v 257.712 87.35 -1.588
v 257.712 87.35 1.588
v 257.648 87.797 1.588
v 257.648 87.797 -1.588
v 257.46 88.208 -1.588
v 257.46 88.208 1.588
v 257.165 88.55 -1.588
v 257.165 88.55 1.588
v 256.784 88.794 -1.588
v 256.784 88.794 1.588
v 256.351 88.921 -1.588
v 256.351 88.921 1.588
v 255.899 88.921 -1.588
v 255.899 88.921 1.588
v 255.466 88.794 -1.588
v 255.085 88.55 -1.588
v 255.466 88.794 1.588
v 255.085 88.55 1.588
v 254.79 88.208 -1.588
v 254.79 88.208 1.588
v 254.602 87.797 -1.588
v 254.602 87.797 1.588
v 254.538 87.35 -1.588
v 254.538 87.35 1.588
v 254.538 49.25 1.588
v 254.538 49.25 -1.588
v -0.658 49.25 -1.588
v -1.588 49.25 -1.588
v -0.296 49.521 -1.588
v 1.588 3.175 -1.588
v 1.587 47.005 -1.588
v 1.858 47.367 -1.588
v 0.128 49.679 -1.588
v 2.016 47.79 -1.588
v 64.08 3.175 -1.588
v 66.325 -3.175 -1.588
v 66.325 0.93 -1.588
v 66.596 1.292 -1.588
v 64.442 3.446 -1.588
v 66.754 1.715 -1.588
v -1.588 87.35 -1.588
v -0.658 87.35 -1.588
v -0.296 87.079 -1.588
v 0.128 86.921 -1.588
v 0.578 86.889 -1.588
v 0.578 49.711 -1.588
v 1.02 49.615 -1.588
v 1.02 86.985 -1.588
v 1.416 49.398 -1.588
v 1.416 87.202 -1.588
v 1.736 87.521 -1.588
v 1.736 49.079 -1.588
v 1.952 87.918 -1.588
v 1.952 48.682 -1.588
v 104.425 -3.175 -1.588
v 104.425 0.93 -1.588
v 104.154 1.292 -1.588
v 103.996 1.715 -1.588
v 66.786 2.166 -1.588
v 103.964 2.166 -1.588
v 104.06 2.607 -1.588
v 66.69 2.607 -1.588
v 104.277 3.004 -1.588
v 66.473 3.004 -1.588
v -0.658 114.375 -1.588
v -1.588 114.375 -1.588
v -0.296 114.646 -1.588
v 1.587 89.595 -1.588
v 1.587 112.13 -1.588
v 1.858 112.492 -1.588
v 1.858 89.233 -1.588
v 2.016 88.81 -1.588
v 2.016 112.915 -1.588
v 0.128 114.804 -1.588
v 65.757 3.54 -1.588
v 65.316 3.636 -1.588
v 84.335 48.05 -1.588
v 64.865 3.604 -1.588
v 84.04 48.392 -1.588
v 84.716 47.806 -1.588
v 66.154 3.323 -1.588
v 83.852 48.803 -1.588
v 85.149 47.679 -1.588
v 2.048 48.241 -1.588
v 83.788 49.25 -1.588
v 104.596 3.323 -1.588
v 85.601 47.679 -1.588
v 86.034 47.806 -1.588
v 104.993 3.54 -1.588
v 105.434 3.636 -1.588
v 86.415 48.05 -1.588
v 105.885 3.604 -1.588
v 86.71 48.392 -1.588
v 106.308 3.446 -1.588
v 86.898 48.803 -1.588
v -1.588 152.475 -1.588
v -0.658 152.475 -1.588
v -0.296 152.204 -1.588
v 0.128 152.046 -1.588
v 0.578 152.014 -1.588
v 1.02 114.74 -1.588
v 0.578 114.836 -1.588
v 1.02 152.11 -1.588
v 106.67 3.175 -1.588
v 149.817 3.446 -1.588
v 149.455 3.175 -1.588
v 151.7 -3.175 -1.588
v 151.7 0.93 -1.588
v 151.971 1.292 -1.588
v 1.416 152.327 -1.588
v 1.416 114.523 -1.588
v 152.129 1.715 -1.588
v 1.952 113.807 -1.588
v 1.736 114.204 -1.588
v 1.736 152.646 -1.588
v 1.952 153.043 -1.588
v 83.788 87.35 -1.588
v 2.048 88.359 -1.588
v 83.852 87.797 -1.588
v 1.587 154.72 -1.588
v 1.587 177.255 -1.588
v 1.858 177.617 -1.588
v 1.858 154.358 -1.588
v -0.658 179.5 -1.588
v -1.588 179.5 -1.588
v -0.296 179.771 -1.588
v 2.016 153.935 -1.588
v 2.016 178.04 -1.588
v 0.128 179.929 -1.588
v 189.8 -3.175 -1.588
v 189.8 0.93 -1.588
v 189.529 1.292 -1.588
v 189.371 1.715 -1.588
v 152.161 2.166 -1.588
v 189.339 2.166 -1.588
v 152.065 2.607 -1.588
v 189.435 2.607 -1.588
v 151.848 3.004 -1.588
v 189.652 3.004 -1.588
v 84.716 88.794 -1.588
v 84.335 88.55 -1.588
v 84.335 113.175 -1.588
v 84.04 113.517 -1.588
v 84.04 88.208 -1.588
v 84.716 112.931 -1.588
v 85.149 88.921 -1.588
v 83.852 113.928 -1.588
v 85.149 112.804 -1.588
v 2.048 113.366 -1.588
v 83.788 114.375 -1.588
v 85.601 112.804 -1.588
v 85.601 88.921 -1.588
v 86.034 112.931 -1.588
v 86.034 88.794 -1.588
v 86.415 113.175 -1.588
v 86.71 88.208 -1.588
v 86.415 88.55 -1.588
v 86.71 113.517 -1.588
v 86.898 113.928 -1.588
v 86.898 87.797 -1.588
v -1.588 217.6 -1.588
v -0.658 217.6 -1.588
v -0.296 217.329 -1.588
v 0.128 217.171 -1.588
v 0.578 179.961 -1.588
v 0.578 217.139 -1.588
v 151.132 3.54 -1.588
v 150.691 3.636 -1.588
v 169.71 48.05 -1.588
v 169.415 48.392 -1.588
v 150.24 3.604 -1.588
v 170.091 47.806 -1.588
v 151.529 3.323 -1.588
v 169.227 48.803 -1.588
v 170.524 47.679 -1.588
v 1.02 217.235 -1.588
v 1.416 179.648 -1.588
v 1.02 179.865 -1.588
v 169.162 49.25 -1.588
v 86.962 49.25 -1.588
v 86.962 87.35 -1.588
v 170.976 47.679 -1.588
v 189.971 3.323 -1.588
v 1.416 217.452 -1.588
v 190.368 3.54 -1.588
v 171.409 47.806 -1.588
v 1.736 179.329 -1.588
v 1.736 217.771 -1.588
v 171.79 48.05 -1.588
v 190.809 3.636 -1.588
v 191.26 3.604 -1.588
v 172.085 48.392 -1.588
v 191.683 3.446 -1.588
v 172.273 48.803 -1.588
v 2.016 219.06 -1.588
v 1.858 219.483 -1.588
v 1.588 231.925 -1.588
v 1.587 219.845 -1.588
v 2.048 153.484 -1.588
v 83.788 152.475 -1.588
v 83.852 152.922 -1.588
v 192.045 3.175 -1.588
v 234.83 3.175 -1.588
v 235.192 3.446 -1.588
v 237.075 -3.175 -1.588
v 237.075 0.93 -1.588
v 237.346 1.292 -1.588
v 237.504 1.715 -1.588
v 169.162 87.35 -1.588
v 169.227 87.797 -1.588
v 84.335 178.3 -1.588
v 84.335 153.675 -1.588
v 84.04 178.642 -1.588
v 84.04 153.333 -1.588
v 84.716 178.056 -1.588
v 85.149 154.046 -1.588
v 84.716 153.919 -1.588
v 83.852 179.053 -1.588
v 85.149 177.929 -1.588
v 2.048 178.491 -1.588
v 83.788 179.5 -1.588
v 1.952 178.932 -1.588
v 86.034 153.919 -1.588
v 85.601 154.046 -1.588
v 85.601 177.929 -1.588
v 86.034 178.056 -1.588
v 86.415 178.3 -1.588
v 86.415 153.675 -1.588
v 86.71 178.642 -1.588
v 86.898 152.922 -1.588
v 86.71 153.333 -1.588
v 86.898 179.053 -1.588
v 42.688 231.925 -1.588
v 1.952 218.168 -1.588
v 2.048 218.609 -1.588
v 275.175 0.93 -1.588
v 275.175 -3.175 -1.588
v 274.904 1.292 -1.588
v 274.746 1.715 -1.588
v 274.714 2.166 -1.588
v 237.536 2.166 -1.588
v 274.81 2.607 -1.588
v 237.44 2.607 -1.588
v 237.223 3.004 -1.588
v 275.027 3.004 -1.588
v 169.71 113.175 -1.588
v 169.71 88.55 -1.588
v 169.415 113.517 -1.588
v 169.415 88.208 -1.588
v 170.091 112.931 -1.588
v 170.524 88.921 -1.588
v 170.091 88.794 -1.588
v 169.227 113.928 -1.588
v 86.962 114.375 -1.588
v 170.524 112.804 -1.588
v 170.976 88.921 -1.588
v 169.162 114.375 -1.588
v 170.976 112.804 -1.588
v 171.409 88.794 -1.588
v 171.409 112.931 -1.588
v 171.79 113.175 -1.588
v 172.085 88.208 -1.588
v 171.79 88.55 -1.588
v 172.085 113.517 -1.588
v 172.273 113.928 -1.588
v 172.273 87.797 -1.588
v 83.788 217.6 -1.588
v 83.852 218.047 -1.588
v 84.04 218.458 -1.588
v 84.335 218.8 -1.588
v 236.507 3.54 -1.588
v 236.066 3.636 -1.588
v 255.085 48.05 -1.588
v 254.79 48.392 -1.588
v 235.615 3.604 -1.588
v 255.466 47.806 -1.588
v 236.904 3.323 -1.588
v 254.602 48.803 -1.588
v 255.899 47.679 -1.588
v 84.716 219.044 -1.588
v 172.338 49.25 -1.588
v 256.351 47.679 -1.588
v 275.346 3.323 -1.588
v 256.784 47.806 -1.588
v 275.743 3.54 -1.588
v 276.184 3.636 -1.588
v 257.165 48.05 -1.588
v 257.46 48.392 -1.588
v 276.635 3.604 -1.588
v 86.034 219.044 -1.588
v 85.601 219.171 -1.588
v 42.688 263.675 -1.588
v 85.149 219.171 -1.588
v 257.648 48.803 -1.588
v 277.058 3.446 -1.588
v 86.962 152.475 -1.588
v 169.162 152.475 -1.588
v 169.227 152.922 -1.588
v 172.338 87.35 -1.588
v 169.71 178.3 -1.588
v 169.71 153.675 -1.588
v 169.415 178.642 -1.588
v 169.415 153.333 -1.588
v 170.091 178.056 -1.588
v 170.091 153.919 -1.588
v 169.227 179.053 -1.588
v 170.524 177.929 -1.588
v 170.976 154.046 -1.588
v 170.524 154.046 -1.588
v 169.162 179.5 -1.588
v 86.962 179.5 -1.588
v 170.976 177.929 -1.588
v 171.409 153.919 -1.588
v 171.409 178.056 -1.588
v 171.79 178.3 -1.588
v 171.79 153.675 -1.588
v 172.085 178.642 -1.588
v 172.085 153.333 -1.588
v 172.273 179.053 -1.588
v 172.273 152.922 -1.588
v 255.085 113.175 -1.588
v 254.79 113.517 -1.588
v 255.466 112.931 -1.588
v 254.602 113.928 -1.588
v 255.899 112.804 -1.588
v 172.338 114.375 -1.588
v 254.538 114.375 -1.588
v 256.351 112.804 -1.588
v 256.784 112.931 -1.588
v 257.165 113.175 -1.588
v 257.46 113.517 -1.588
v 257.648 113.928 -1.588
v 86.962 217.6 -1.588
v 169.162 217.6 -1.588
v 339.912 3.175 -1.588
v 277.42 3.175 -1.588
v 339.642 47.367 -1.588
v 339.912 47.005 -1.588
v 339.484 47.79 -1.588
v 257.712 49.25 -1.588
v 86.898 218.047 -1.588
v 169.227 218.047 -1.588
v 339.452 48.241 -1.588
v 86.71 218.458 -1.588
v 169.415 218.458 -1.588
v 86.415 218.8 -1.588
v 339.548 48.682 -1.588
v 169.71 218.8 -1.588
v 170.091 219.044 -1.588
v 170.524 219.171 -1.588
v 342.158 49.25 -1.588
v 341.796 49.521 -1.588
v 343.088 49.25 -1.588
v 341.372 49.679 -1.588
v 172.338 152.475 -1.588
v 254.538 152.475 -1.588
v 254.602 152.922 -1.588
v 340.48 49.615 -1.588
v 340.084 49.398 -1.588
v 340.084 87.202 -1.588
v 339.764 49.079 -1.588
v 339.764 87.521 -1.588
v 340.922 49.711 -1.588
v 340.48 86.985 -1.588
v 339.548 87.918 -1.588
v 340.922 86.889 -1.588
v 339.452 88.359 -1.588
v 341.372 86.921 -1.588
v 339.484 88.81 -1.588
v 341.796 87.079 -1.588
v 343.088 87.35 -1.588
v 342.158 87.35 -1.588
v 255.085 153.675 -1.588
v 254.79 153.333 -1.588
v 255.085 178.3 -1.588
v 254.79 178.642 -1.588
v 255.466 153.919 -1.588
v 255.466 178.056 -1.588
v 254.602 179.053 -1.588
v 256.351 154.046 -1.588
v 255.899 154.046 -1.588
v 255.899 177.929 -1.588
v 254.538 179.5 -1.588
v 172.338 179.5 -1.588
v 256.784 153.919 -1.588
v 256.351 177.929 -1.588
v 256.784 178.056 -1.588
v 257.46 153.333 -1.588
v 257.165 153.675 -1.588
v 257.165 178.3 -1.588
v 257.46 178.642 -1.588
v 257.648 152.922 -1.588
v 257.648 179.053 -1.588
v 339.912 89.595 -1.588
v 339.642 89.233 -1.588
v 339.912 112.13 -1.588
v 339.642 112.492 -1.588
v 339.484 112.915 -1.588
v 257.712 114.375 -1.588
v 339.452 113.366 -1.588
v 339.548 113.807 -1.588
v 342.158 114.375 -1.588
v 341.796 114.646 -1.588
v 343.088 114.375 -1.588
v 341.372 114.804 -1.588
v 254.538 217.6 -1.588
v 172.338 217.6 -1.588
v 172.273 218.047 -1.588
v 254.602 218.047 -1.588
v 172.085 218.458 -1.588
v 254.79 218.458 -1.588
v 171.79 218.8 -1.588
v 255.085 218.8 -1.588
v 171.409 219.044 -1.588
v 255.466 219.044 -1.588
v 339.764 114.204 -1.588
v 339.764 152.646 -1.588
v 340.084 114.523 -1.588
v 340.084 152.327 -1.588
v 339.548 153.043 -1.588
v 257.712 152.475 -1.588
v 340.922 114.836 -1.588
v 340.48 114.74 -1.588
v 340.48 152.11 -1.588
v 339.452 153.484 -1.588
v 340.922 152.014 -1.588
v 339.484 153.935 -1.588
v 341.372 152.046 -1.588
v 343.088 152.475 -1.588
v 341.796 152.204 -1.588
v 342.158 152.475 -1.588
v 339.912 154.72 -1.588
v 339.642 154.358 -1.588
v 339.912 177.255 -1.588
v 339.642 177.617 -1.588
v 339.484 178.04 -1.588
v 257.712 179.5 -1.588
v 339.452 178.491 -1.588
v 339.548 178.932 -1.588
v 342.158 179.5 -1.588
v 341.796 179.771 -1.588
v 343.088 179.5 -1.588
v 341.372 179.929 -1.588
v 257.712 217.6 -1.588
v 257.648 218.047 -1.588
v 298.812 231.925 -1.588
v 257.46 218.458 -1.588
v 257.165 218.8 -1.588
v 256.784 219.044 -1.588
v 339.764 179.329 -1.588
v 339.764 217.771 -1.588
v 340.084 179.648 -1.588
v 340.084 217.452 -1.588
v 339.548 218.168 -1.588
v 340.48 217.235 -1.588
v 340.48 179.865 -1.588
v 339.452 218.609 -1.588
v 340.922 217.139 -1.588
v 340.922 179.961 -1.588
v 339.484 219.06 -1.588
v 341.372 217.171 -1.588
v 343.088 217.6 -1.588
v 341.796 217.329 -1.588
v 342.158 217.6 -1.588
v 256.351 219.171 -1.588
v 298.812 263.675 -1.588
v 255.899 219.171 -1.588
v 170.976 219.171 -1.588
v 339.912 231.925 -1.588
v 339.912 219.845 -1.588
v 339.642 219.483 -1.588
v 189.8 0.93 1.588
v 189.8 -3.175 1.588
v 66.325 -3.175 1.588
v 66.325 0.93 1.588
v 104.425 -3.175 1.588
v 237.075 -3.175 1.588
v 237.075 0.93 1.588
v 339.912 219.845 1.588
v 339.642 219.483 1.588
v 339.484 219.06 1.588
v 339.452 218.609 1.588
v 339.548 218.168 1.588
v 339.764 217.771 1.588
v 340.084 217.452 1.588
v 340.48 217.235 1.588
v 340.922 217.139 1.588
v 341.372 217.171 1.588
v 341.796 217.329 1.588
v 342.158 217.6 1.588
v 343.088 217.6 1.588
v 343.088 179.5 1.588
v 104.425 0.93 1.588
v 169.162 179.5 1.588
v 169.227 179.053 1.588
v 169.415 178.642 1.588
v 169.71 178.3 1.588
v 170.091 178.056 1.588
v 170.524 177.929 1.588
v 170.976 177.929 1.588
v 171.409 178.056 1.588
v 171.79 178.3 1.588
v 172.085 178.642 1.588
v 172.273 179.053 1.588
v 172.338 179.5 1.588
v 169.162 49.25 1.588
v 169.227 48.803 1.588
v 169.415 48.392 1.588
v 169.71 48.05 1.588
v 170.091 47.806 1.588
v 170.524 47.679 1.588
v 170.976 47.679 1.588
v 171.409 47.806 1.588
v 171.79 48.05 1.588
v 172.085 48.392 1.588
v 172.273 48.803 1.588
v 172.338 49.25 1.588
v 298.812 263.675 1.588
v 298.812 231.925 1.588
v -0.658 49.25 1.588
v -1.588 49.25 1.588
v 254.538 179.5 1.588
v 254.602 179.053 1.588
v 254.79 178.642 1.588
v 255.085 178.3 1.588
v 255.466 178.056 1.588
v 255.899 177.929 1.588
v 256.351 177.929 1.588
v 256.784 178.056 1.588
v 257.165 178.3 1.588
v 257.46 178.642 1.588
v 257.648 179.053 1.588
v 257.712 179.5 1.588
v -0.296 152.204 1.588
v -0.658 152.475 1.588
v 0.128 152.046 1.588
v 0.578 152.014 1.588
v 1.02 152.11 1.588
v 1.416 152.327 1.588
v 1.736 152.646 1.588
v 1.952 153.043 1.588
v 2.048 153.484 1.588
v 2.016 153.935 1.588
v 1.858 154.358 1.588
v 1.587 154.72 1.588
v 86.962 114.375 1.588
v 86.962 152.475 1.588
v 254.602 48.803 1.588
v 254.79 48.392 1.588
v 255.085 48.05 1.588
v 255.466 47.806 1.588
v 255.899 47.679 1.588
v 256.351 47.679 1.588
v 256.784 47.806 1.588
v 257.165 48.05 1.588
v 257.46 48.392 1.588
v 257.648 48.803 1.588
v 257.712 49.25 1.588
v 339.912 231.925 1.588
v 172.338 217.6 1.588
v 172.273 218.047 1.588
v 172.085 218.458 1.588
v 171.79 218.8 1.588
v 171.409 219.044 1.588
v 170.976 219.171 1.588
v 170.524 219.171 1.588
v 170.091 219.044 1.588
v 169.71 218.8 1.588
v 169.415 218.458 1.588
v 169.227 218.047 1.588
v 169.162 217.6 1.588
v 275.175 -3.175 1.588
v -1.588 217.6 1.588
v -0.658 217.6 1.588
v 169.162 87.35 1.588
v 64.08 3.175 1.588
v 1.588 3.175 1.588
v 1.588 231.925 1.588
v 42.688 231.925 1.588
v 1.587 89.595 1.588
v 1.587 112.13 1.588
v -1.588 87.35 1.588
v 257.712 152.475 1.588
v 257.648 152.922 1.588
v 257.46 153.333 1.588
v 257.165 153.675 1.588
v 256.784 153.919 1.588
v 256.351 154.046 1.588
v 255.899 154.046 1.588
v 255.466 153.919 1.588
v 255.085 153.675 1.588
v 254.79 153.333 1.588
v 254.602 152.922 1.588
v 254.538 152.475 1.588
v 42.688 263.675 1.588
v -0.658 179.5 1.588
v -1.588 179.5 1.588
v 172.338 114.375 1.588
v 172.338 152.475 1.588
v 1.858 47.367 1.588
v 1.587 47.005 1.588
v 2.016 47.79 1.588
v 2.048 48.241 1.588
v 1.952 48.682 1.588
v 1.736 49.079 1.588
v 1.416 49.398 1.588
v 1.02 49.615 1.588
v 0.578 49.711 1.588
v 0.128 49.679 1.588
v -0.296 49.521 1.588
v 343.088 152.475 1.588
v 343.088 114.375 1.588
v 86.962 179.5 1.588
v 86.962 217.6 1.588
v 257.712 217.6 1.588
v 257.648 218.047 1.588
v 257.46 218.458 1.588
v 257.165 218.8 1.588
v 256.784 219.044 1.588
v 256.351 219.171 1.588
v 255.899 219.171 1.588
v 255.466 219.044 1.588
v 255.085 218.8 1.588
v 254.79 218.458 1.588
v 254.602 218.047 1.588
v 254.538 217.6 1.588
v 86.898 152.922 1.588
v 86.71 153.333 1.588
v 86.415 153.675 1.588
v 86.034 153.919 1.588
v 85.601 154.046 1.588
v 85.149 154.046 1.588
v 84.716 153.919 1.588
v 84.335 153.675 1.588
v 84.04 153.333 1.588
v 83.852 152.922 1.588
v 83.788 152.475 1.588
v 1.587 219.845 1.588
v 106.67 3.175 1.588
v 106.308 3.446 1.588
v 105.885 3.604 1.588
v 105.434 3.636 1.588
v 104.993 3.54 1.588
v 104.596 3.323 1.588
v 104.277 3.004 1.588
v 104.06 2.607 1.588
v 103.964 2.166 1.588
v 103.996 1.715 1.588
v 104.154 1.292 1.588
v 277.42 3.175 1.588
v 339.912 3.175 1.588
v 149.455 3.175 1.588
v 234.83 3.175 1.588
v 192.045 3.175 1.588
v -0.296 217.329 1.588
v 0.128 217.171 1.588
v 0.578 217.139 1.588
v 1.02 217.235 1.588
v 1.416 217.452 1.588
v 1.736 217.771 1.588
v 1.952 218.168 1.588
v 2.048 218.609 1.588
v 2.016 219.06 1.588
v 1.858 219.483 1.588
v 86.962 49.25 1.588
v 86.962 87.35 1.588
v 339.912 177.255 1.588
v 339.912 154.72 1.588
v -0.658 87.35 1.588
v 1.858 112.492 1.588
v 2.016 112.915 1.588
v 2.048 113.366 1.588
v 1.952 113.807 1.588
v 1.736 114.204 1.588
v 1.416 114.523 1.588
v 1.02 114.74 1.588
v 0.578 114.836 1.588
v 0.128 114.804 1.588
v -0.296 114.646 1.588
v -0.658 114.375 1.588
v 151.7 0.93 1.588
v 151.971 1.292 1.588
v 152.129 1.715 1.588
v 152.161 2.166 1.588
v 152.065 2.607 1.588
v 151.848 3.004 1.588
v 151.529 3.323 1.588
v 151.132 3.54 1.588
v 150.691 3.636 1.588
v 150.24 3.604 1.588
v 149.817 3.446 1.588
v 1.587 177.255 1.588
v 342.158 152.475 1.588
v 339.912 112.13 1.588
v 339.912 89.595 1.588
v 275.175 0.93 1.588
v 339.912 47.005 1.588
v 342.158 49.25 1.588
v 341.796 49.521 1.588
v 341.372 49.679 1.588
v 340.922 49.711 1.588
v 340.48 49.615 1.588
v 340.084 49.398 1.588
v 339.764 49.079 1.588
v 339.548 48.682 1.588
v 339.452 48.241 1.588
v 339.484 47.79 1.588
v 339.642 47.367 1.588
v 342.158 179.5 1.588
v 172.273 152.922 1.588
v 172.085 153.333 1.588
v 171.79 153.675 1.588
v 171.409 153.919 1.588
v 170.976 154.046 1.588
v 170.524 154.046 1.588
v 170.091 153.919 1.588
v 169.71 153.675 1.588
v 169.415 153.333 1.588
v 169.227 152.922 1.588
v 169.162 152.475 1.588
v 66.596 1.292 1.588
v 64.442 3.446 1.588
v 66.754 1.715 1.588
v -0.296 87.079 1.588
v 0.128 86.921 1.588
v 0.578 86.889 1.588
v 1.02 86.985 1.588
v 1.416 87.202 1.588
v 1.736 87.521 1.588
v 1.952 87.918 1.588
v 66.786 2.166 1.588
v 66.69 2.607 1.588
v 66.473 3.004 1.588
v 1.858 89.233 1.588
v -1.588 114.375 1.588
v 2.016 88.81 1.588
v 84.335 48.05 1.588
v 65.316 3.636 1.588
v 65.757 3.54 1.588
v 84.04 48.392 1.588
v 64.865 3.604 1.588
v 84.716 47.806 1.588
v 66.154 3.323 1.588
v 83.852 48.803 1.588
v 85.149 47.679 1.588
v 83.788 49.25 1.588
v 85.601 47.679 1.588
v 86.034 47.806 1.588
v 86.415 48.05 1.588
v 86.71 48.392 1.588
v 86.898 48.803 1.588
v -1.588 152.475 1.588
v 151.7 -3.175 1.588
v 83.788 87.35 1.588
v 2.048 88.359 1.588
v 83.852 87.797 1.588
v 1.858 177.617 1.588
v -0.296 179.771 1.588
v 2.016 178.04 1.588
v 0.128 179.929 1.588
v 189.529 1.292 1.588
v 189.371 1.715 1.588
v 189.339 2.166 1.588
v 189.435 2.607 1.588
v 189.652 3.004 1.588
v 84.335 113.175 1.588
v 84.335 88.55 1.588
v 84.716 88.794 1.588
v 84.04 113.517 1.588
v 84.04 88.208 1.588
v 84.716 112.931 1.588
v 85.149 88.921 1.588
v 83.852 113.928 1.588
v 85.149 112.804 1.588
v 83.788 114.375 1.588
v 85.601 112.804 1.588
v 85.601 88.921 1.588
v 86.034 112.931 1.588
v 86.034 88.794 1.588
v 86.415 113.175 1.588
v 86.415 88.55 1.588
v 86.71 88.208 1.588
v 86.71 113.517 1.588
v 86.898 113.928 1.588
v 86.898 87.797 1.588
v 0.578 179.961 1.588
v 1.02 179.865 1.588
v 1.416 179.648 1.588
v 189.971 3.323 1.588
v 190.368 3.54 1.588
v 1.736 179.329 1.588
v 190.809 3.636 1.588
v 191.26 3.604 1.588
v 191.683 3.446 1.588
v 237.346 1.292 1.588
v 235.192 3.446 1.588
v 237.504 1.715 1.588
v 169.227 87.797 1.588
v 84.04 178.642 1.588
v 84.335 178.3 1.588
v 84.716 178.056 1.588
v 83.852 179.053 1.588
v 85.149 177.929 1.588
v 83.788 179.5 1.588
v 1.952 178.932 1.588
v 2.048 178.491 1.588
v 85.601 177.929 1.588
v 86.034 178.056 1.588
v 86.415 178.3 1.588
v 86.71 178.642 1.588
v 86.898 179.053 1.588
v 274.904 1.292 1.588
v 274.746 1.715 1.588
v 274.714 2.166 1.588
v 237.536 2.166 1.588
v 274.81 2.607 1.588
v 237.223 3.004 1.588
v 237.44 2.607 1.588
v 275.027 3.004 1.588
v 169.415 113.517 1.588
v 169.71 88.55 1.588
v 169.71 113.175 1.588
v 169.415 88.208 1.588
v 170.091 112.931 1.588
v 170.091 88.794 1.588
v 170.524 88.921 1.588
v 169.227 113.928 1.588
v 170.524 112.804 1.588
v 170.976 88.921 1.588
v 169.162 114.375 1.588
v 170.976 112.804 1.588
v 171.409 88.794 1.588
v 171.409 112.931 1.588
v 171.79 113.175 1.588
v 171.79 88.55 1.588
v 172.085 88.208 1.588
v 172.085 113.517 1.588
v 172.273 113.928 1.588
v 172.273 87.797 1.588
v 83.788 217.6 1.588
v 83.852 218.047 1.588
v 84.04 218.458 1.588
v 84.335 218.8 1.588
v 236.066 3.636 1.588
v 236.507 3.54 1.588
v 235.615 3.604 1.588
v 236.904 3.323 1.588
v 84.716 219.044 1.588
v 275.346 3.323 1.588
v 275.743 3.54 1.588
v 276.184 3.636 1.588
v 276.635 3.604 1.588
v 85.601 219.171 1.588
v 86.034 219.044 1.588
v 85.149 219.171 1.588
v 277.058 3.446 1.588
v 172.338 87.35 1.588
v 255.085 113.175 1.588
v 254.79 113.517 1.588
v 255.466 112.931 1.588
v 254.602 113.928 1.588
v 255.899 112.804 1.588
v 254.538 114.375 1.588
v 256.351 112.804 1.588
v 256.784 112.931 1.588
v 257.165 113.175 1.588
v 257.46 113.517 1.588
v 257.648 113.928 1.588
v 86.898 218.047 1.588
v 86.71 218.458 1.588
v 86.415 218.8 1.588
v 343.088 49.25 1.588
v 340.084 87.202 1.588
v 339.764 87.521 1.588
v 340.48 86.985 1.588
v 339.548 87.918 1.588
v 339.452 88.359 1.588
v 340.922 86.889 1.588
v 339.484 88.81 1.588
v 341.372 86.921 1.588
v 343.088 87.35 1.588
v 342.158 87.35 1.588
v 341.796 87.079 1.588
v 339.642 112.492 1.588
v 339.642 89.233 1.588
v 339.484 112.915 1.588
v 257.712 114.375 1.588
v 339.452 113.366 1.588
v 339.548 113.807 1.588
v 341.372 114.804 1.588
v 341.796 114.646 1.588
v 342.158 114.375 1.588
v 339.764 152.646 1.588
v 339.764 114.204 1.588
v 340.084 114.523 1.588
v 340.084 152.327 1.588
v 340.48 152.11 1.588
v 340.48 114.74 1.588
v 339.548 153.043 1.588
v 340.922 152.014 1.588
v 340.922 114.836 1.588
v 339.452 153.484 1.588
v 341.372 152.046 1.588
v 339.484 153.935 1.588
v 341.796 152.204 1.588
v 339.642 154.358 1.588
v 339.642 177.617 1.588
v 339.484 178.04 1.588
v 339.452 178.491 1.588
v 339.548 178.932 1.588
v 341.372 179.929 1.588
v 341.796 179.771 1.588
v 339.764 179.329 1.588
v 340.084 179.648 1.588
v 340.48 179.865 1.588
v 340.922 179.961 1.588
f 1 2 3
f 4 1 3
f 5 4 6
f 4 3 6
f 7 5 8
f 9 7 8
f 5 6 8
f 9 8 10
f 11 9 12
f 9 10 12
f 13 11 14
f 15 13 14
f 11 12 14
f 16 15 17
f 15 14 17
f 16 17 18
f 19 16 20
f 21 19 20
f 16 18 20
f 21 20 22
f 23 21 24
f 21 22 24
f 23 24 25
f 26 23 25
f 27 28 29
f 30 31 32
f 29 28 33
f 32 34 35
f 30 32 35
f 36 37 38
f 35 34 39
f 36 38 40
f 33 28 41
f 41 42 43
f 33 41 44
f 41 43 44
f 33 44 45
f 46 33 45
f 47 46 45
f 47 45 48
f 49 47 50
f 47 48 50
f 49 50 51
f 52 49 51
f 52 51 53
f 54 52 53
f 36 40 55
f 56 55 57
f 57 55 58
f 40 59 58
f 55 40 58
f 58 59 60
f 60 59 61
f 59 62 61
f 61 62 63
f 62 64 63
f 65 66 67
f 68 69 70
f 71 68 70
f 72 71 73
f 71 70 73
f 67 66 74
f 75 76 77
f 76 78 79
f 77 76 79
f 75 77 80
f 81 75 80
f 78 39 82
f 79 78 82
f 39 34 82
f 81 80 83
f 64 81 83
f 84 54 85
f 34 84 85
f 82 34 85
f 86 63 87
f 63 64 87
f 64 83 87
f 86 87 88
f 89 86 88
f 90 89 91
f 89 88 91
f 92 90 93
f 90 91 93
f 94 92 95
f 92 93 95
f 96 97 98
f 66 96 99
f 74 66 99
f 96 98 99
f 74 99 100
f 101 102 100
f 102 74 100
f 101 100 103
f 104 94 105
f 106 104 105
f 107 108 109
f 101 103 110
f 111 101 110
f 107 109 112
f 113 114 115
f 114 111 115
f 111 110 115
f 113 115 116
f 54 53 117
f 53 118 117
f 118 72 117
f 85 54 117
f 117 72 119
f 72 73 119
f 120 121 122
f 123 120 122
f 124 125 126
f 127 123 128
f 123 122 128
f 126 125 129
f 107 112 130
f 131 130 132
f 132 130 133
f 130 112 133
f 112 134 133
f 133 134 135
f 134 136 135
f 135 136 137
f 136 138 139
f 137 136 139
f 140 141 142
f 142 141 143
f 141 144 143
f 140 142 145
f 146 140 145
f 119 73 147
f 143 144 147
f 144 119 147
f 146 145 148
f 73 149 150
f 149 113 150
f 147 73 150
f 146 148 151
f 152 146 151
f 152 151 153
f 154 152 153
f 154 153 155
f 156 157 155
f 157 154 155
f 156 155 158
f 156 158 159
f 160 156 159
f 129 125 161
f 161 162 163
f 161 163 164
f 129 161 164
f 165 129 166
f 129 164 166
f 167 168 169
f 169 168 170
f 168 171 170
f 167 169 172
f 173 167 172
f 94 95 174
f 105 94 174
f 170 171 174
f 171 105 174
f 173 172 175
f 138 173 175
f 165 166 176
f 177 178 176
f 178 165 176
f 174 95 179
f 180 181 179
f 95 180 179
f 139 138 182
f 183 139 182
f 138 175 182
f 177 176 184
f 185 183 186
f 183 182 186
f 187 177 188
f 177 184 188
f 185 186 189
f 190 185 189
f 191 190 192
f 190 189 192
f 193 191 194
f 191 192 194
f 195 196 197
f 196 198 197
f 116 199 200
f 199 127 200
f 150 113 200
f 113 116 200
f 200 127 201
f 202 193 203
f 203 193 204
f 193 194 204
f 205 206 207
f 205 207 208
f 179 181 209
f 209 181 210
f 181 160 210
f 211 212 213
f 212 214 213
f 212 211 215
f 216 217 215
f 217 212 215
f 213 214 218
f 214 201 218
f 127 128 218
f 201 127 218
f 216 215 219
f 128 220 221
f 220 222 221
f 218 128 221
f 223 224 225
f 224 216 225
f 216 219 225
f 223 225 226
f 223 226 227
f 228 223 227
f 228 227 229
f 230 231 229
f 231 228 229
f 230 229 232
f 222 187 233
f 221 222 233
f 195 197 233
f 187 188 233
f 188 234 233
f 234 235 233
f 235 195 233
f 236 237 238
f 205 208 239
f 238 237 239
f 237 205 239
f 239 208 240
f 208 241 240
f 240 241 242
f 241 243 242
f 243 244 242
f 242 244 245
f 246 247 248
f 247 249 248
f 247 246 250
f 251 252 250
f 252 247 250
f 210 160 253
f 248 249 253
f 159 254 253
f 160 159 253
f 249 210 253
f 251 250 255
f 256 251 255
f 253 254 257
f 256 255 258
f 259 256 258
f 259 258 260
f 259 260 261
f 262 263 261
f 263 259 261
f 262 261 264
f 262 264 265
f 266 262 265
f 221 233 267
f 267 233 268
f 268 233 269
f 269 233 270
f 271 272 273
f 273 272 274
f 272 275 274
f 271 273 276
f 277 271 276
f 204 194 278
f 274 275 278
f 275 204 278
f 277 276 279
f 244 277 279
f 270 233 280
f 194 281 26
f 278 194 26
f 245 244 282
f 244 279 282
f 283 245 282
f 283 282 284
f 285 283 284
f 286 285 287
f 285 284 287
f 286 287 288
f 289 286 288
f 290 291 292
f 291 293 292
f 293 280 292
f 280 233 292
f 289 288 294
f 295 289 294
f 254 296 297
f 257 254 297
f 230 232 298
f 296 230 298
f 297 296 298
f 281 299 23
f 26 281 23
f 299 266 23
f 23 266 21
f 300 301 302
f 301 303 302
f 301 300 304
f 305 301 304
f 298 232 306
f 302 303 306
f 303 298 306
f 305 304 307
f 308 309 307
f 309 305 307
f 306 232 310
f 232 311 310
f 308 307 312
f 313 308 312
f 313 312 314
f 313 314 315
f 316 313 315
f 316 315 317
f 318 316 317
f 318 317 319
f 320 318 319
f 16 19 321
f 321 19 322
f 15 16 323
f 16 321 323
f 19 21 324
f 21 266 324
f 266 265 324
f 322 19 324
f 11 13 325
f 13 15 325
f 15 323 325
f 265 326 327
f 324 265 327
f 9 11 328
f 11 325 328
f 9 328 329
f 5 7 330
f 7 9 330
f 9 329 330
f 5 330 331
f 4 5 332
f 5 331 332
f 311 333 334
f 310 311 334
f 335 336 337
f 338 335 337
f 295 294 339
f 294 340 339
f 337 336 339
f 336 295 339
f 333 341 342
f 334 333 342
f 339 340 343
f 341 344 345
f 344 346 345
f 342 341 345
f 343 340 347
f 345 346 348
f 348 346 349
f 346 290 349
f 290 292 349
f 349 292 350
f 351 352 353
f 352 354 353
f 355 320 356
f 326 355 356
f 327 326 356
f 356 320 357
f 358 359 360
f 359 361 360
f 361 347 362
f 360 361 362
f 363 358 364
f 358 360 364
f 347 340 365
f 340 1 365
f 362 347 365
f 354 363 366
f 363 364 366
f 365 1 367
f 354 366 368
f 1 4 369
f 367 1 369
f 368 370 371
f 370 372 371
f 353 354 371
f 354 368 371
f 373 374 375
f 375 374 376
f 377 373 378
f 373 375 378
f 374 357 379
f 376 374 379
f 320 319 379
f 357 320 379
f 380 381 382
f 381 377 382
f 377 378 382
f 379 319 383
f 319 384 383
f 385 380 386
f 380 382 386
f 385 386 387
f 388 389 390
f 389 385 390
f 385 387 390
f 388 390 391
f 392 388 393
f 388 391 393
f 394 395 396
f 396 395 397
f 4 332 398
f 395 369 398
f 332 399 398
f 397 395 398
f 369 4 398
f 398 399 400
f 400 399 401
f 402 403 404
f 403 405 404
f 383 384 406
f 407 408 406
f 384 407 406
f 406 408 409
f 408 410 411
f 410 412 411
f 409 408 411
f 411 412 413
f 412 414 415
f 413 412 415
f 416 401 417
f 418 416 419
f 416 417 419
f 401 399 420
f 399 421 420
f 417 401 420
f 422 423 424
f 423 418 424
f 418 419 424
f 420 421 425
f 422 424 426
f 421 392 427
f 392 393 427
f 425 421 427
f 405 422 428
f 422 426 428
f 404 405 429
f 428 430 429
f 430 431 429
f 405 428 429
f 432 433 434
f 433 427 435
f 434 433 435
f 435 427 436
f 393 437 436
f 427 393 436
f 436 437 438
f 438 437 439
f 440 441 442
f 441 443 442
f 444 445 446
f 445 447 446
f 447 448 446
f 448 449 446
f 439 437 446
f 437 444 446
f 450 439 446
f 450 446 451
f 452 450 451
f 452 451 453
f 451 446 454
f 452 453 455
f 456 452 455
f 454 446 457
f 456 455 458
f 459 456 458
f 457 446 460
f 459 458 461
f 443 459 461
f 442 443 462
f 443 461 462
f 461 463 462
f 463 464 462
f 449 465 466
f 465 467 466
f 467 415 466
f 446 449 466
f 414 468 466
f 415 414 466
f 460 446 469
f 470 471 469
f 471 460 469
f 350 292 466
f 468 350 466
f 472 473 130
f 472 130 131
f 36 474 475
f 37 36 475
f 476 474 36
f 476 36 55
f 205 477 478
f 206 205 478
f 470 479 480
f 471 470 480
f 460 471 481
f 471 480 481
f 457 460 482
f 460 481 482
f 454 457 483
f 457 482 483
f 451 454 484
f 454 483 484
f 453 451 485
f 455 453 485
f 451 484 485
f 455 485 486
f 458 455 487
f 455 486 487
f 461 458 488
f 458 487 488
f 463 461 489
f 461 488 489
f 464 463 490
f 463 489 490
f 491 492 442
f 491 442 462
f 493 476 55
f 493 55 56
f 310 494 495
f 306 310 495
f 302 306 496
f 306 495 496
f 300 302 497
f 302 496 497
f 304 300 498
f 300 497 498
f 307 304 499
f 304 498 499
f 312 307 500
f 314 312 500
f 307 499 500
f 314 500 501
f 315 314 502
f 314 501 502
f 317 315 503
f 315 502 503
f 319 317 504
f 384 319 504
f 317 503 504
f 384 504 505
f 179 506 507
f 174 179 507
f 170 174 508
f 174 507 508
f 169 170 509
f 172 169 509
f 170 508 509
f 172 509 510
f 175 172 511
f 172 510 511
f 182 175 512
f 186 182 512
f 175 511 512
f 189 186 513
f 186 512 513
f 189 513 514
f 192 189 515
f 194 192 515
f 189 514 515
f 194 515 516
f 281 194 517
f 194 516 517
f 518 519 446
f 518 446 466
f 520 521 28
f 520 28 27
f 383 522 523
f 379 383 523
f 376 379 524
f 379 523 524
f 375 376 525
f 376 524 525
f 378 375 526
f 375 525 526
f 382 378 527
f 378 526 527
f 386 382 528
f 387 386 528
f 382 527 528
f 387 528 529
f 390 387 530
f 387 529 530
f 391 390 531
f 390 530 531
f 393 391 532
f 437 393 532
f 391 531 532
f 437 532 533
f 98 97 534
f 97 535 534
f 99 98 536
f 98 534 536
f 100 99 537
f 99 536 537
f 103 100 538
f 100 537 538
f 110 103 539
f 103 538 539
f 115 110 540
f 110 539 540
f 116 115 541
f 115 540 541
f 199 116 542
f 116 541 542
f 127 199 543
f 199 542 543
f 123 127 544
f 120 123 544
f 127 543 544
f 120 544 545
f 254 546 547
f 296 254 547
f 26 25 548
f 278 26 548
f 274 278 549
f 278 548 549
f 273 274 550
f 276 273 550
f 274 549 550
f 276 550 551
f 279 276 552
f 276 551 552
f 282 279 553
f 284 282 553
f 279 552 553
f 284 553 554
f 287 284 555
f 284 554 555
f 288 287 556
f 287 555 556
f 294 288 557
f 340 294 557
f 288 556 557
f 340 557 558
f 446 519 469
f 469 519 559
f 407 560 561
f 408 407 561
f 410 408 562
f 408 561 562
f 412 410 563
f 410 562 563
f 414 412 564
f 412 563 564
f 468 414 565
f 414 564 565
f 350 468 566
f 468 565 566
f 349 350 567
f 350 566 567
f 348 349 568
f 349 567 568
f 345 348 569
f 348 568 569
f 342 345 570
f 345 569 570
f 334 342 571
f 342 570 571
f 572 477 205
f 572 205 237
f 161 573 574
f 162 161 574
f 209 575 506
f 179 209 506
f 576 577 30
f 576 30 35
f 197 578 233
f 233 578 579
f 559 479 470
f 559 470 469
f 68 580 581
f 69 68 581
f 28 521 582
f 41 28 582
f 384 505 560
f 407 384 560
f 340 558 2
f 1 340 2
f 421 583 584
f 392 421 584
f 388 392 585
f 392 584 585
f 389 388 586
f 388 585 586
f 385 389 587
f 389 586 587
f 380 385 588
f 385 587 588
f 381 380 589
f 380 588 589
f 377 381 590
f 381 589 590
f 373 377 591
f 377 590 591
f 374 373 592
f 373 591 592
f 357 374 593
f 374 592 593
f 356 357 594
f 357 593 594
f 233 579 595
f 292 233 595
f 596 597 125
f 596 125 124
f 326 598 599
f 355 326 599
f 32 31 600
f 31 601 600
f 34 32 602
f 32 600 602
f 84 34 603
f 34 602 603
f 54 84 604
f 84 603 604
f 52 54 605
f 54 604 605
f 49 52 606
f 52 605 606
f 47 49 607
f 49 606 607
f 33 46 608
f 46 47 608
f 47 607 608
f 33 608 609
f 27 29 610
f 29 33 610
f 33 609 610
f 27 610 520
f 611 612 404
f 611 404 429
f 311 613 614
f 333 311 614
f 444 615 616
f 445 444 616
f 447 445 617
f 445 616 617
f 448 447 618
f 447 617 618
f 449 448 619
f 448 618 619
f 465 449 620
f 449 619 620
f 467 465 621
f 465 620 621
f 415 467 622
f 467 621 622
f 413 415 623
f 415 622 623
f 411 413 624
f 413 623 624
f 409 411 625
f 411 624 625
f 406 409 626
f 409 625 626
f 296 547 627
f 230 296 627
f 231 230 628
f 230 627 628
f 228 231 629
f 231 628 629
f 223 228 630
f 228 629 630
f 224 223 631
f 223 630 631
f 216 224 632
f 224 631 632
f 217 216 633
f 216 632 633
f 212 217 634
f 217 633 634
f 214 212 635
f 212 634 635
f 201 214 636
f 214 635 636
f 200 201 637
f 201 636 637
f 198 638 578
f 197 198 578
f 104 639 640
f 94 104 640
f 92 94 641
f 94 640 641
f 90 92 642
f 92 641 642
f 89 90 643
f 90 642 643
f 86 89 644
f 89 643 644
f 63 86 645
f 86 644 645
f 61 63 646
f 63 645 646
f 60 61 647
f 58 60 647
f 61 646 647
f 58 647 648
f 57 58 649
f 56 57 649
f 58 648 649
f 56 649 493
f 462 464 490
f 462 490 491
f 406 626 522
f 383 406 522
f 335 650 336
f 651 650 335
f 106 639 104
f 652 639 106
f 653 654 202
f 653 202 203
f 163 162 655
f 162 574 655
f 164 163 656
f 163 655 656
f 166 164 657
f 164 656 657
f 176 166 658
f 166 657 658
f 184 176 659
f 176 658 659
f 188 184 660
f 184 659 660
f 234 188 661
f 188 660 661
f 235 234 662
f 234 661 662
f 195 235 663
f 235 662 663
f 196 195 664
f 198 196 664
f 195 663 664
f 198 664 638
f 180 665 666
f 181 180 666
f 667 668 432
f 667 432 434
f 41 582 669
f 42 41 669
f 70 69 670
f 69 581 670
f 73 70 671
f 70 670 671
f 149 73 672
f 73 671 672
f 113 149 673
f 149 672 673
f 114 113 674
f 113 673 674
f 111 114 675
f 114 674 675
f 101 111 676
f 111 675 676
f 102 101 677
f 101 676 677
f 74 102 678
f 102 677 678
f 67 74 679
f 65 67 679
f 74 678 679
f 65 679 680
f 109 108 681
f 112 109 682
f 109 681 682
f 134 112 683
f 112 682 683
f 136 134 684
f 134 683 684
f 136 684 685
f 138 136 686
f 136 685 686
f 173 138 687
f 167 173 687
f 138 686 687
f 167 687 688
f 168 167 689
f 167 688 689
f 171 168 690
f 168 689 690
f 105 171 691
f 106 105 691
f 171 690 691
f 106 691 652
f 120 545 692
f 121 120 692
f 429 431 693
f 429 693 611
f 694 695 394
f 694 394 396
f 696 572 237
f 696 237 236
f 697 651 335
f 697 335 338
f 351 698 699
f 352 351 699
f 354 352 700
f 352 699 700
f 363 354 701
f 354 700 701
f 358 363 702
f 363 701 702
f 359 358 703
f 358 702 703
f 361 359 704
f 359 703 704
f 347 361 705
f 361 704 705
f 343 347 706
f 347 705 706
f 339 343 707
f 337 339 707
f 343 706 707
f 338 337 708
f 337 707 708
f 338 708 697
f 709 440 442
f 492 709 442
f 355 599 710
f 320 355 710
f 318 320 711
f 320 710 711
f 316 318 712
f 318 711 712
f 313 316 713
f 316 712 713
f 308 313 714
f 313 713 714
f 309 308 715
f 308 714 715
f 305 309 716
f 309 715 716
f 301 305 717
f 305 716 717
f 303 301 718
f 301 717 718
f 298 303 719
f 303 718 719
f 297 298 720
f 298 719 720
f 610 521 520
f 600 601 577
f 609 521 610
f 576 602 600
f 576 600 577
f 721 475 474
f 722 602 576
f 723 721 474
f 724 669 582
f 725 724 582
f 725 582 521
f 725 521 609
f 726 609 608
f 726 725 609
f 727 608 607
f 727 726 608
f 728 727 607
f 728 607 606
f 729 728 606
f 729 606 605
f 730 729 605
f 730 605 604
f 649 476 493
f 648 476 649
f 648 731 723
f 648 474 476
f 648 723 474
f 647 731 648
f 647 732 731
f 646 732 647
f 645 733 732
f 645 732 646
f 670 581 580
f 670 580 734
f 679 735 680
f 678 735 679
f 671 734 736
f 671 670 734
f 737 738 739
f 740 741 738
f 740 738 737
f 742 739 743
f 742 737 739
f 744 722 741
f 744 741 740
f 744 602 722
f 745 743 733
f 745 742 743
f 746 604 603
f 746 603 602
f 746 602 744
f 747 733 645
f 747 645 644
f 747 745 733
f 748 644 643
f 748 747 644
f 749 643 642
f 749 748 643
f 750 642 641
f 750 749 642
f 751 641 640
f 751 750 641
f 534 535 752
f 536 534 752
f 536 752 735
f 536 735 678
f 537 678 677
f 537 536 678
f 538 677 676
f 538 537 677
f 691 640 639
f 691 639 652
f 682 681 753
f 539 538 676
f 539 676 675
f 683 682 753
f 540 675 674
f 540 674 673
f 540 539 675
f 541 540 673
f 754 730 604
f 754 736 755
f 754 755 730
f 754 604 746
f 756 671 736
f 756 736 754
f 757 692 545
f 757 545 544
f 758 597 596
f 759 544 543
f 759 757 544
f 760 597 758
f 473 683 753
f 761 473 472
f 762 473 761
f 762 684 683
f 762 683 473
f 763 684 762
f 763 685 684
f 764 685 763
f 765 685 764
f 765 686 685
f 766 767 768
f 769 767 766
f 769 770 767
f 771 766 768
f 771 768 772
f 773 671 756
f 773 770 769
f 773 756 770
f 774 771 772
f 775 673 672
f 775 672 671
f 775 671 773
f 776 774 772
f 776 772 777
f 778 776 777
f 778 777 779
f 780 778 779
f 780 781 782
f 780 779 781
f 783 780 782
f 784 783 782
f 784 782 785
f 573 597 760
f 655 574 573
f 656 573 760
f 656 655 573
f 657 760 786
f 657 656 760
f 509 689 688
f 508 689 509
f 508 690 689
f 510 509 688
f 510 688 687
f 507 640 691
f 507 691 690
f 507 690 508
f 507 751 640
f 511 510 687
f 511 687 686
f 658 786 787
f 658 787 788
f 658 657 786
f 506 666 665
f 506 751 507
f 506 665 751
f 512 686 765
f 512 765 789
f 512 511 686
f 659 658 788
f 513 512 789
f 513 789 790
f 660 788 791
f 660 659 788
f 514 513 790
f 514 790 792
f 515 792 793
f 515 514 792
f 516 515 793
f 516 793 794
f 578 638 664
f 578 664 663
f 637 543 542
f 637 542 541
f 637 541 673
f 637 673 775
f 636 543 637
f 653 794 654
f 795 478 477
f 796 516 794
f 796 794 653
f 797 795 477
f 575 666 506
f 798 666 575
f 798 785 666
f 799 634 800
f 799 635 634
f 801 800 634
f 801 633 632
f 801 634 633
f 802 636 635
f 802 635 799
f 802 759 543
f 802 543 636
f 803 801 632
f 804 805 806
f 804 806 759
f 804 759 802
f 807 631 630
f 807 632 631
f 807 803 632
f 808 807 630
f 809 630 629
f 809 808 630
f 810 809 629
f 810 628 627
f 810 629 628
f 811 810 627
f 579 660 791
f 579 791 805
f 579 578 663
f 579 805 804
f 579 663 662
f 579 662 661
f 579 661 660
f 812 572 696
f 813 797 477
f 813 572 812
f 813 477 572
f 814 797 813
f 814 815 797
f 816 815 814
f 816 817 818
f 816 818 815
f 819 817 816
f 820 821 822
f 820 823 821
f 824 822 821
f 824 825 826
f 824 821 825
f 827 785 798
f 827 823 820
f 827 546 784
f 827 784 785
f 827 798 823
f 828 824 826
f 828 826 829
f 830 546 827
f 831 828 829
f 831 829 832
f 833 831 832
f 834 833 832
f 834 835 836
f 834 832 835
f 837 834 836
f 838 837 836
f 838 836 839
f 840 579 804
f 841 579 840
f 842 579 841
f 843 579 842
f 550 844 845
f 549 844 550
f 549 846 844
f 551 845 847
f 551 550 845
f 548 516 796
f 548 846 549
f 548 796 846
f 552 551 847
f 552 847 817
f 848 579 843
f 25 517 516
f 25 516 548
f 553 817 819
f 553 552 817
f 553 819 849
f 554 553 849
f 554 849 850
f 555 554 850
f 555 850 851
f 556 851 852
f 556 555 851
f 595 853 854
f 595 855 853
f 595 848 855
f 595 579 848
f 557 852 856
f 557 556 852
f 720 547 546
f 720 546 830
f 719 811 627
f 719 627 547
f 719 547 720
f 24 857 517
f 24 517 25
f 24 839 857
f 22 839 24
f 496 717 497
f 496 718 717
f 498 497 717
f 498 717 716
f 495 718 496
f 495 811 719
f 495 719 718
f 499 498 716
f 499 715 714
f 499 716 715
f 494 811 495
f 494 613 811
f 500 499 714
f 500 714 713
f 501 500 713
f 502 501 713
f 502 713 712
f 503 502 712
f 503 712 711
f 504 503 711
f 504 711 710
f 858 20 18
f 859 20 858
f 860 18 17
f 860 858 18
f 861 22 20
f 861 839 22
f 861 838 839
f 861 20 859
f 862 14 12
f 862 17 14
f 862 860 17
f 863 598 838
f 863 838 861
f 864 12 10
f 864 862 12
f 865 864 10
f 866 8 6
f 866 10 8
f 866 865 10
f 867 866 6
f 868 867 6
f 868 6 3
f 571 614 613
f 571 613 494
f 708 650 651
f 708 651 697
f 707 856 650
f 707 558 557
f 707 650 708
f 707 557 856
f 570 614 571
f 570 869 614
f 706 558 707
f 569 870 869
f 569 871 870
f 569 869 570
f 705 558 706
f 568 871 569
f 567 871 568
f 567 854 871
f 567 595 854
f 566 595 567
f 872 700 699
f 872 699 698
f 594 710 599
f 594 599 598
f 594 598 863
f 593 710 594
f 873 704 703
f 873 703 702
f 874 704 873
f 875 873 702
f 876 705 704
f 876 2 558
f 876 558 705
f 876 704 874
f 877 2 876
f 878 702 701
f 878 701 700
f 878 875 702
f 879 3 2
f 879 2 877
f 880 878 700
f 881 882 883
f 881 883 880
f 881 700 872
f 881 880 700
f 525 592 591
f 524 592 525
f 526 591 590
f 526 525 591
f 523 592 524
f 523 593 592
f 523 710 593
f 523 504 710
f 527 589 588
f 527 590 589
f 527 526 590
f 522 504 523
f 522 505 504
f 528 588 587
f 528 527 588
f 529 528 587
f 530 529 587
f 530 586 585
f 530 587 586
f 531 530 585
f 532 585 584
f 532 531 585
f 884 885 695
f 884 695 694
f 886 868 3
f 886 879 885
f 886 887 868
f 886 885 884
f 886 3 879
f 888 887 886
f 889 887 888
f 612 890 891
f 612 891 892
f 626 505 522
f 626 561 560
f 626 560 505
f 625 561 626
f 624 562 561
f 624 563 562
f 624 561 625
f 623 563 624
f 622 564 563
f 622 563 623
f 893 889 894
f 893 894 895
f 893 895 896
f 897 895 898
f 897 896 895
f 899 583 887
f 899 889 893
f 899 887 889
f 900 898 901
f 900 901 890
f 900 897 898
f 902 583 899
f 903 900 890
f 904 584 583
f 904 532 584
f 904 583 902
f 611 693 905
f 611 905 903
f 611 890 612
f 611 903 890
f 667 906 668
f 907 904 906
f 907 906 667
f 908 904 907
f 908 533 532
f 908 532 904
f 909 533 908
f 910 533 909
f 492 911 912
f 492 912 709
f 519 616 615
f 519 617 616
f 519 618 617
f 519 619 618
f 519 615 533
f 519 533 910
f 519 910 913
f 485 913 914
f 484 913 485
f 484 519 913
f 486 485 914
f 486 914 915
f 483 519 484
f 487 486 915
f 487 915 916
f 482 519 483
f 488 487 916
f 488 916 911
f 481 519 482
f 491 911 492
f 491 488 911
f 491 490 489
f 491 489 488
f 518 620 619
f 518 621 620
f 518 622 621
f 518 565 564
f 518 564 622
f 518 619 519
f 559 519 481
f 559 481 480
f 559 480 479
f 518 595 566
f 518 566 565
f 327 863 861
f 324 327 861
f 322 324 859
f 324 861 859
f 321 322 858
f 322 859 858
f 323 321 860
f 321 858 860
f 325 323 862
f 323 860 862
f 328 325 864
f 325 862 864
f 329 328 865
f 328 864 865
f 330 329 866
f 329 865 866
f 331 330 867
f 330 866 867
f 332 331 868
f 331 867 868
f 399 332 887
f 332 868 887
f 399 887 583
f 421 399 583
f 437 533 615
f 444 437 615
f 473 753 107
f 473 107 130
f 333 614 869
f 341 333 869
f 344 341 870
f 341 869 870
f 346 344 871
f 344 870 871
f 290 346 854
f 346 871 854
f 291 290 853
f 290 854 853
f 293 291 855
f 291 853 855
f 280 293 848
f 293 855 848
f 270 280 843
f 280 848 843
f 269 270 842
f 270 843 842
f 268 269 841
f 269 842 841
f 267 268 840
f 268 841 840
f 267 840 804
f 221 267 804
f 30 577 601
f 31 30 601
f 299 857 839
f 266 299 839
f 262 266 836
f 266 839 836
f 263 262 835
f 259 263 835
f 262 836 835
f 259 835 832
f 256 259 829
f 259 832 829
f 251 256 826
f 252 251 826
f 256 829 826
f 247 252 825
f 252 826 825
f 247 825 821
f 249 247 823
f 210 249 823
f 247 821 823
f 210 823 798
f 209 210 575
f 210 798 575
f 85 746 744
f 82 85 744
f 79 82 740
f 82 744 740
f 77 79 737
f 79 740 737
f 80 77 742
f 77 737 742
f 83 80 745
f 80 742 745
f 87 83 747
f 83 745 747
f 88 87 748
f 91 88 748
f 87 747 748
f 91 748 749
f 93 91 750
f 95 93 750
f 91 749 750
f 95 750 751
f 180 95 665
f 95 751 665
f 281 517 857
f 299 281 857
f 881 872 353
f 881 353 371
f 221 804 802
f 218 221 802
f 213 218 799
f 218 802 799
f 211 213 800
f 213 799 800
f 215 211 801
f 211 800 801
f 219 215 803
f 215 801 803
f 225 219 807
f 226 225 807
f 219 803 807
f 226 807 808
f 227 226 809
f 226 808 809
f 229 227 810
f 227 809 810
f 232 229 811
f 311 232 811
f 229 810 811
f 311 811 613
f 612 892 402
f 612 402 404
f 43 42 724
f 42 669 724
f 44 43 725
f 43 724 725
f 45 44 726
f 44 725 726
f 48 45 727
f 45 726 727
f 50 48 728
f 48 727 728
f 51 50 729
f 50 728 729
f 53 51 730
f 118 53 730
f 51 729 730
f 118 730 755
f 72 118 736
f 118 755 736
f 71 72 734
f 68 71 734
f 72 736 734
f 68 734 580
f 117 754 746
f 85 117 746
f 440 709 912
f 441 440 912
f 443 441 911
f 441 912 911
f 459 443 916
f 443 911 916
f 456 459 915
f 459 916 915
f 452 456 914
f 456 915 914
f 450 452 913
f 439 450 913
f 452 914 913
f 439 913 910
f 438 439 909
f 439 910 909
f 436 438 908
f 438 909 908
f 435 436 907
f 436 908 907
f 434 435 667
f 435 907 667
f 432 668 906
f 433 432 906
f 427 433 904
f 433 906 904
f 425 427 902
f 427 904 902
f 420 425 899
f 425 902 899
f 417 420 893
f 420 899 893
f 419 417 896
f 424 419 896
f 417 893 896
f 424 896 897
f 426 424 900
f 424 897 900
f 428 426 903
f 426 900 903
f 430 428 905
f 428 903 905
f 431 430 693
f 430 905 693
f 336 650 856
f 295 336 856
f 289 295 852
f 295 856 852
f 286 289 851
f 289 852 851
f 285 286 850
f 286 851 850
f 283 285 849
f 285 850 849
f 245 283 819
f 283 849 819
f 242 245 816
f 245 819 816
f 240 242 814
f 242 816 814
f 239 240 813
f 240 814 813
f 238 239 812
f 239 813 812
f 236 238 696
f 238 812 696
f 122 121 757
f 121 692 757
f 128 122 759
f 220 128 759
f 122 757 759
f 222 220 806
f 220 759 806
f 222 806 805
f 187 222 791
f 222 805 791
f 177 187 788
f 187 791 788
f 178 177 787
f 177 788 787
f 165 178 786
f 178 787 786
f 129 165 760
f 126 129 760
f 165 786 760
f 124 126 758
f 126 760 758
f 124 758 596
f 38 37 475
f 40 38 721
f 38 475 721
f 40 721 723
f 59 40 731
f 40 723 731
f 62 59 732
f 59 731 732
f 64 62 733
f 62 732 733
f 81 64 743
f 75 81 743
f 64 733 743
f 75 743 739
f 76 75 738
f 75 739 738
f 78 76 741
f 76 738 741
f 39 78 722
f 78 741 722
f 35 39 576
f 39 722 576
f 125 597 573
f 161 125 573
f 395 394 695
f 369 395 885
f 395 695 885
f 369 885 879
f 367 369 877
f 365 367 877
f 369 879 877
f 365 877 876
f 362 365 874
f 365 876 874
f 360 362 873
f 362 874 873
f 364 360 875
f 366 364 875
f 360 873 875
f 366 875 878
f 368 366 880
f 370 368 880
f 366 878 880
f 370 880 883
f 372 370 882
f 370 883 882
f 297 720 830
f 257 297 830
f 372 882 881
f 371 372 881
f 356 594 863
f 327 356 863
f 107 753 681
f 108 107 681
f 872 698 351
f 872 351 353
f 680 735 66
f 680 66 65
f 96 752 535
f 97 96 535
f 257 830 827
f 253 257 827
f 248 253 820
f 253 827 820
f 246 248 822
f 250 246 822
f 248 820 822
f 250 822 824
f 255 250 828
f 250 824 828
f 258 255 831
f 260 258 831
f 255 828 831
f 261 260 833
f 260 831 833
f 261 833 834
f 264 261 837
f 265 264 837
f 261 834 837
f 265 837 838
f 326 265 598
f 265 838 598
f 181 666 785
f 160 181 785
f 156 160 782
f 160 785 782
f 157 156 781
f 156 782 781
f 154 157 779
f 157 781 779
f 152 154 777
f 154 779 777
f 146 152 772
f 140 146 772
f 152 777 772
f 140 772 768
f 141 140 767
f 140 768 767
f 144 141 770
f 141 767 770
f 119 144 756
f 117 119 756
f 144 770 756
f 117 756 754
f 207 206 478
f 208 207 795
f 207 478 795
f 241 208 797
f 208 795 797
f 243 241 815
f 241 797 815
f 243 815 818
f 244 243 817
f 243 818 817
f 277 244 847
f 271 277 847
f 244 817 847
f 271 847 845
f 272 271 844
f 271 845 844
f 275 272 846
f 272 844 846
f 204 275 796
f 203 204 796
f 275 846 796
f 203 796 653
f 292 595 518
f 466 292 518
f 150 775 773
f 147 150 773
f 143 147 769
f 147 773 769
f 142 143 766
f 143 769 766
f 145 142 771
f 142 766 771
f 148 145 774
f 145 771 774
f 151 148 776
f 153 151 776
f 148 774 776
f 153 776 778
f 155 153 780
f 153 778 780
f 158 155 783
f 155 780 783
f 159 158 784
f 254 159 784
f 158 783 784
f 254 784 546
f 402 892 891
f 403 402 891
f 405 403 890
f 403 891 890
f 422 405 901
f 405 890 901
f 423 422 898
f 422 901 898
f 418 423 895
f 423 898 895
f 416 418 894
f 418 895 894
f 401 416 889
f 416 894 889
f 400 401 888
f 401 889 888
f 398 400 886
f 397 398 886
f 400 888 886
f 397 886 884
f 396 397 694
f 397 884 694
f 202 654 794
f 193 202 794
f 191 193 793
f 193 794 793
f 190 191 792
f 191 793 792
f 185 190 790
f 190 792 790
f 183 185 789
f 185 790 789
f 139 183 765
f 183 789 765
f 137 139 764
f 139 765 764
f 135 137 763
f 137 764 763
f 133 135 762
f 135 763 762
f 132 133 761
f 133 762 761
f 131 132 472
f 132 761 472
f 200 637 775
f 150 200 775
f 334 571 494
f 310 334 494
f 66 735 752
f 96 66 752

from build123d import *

# Parameters (mm, degrees)
SKETCH1_W           = 338.325
SKETCH1_H           = 260.5
BOSS_EXTRUDE1_DEPTH = 1.5875
CUT_EXTRUDE1_DEPTH  = 3.175
SKETCH4_W           = 3.175
SKETCH4_H           = 38.1
SKETCH4_W_2         = 38.1
SKETCH4_H_2         = 6.35
BOSS_EXTRUDE2_DEPTH = 3.175
SKETCH5_R           = 1.5875
CUT_EXTRUDE3_DEPTH  = 3.175
SKETCH6_W           = 42.6875
SKETCH6_H           = 31.75
CUT_EXTRUDE4_DEPTH  = 3.175


with BuildPart() as part:
    # Sketch1 → Boss-Extrude1 (new body, symmetric)
    with BuildSketch(Plane.XY):
        with Locations((170.75, 133.425)):
            Rectangle(SKETCH1_W, SKETCH1_H)
    extrude(amount=BOSS_EXTRUDE1_DEPTH, both=True)

    # Sketch3 → Cut-Extrude1 (cut)
    with BuildSketch(Plane.XY.offset(1.5875)):
        with BuildLine():
            Line((169.1625, 217.6), (169.1625, 179.5))
            ThreePointArc((169.1625, 179.5), (170.75, 177.9125), (172.3375, 179.5))
            Line((172.3375, 179.5), (172.3375, 217.6))
            ThreePointArc((172.3375, 217.6), (170.75, 219.1875), (169.1625, 217.6))
        make_face()
        with BuildLine():
            Line((83.7875, 217.6), (83.7875, 179.5))
            ThreePointArc((83.7875, 179.5), (85.375, 177.9125), (86.9625, 179.5))
            Line((86.9625, 179.5), (86.9625, 217.6))
            ThreePointArc((86.9625, 217.6), (85.375, 219.1875), (83.7875, 217.6))
        make_face()
        with BuildLine():
            Line((254.5375, 217.6), (254.5375, 179.5))
            ThreePointArc((254.5375, 179.5), (256.125, 177.9125), (257.7125, 179.5))
            Line((257.7125, 179.5), (257.7125, 217.6))
            ThreePointArc((257.7125, 217.6), (256.125, 219.1875), (254.5375, 217.6))
        make_face()
        with BuildLine():
            Line((169.1625, 152.475), (169.1625, 114.375))
            ThreePointArc((169.1625, 114.375), (170.75, 112.7875), (172.3375, 114.375))
            Line((172.3375, 114.375), (172.3375, 152.475))
            ThreePointArc((172.3375, 152.475), (170.75, 154.0625), (169.1625, 152.475))
        make_face()
        with BuildLine():
            Line((83.7875, 152.475), (83.7875, 114.375))
            ThreePointArc((83.7875, 114.375), (85.375, 112.7875), (86.9625, 114.375))
            Line((86.9625, 114.375), (86.9625, 152.475))
            ThreePointArc((86.9625, 152.475), (85.375, 154.0625), (83.7875, 152.475))
        make_face()
        with BuildLine():
            Line((254.5375, 152.475), (254.5375, 114.375))
            ThreePointArc((254.5375, 114.375), (256.125, 112.7875), (257.7125, 114.375))
            Line((257.7125, 114.375), (257.7125, 152.475))
            ThreePointArc((257.7125, 152.475), (256.125, 154.0625), (254.5375, 152.475))
        make_face()
        with BuildLine():
            Line((169.1625, 87.35), (169.1625, 49.25))
            ThreePointArc((169.1625, 49.25), (170.75, 47.6625), (172.3375, 49.25))
            Line((172.3375, 49.25), (172.3375, 87.35))
            ThreePointArc((172.3375, 87.35), (170.75, 88.9375), (169.1625, 87.35))
        make_face()
        with BuildLine():
            Line((83.7875, 87.35), (83.7875, 49.25))
            ThreePointArc((83.7875, 49.25), (85.375, 47.6625), (86.9625, 49.25))
            Line((86.9625, 49.25), (86.9625, 87.35))
            ThreePointArc((86.9625, 87.35), (85.375, 88.9375), (83.7875, 87.35))
        make_face()
        with BuildLine():
            Line((254.5375, 87.35), (254.5375, 49.25))
            ThreePointArc((254.5375, 49.25), (256.125, 47.6625), (257.7125, 49.25))
            Line((257.7125, 49.25), (257.7125, 87.35))
            ThreePointArc((257.7125, 87.35), (256.125, 88.9375), (254.5375, 87.35))
        make_face()
    extrude(amount=-CUT_EXTRUDE1_DEPTH, mode=Mode.SUBTRACT)

    # Sketch4 → Boss-Extrude2 (add)
    with BuildSketch(Plane.XY.offset(1.5875)):
        with Locations((0, 198.55)):
            Rectangle(SKETCH4_W, SKETCH4_H)
        with Locations((0, 133.425)):
            Rectangle(SKETCH4_W, SKETCH4_H)
        with Locations((0, 68.3)):
            Rectangle(SKETCH4_W, SKETCH4_H)
        with Locations((85.375, 0)):
            Rectangle(SKETCH4_W_2, SKETCH4_H_2)
        with Locations((170.75, 0)):
            Rectangle(SKETCH4_W_2, SKETCH4_H_2)
        with Locations((256.125, 0)):
            Rectangle(SKETCH4_W_2, SKETCH4_H_2)
        with Locations((341.5, 68.3)):
            Rectangle(SKETCH4_W, SKETCH4_H)
        with Locations((341.5, 133.425)):
            Rectangle(SKETCH4_W, SKETCH4_H)
        with Locations((341.5, 198.55)):
            Rectangle(SKETCH4_W, SKETCH4_H)
    extrude(amount=-BOSS_EXTRUDE2_DEPTH)

    # Sketch5 → Cut-Extrude3 (cut)
    with BuildSketch(Plane.XY.offset(1.5875)):
        with Locations((0.464967985, 218.722532015)):
            Circle(SKETCH5_R)
        with Locations((0.464967985, 178.377467985)):
            Circle(SKETCH5_R)
        with Locations((0.464967985, 153.597532015)):
            Circle(SKETCH5_R)
        with Locations((0.464967985, 113.252467985)):
            Circle(SKETCH5_R)
        with Locations((0.464967985, 88.472532015)):
            Circle(SKETCH5_R)
        with Locations((0.464967985, 48.127467985)):
            Circle(SKETCH5_R)
        with Locations((341.035032015, 48.127467985)):
            Circle(SKETCH5_R)
        with Locations((341.035032015, 88.472532015)):
            Circle(SKETCH5_R)
        with Locations((341.035032015, 113.252467985)):
            Circle(SKETCH5_R)
        with Locations((341.035032015, 153.597532015)):
            Circle(SKETCH5_R)
        with Locations((341.035032015, 178.377467985)):
            Circle(SKETCH5_R)
        with Locations((341.035032015, 218.722532015)):
            Circle(SKETCH5_R)
        with Locations((65.202467985, 2.052467985)):
            Circle(SKETCH5_R)
        with Locations((105.547532015, 2.052467985)):
            Circle(SKETCH5_R)
        with Locations((150.577467985, 2.052467985)):
            Circle(SKETCH5_R)
        with Locations((190.922532015, 2.052467985)):
            Circle(SKETCH5_R)
        with Locations((235.952467985, 2.052467985)):
            Circle(SKETCH5_R)
        with Locations((276.297532015, 2.052467985)):
            Circle(SKETCH5_R)
    extrude(amount=-CUT_EXTRUDE3_DEPTH, mode=Mode.SUBTRACT)

    # Sketch6 → Cut-Extrude4 (cut)
    with BuildSketch(Plane.XY.offset(1.5875)):
        with Locations((320.15625, 247.8)):
            Rectangle(SKETCH6_W, SKETCH6_H)
        with Locations((21.34375, 247.8)):
            Rectangle(SKETCH6_W, SKETCH6_H)
    extrude(amount=-CUT_EXTRUDE4_DEPTH, mode=Mode.SUBTRACT)


solid = part.part
